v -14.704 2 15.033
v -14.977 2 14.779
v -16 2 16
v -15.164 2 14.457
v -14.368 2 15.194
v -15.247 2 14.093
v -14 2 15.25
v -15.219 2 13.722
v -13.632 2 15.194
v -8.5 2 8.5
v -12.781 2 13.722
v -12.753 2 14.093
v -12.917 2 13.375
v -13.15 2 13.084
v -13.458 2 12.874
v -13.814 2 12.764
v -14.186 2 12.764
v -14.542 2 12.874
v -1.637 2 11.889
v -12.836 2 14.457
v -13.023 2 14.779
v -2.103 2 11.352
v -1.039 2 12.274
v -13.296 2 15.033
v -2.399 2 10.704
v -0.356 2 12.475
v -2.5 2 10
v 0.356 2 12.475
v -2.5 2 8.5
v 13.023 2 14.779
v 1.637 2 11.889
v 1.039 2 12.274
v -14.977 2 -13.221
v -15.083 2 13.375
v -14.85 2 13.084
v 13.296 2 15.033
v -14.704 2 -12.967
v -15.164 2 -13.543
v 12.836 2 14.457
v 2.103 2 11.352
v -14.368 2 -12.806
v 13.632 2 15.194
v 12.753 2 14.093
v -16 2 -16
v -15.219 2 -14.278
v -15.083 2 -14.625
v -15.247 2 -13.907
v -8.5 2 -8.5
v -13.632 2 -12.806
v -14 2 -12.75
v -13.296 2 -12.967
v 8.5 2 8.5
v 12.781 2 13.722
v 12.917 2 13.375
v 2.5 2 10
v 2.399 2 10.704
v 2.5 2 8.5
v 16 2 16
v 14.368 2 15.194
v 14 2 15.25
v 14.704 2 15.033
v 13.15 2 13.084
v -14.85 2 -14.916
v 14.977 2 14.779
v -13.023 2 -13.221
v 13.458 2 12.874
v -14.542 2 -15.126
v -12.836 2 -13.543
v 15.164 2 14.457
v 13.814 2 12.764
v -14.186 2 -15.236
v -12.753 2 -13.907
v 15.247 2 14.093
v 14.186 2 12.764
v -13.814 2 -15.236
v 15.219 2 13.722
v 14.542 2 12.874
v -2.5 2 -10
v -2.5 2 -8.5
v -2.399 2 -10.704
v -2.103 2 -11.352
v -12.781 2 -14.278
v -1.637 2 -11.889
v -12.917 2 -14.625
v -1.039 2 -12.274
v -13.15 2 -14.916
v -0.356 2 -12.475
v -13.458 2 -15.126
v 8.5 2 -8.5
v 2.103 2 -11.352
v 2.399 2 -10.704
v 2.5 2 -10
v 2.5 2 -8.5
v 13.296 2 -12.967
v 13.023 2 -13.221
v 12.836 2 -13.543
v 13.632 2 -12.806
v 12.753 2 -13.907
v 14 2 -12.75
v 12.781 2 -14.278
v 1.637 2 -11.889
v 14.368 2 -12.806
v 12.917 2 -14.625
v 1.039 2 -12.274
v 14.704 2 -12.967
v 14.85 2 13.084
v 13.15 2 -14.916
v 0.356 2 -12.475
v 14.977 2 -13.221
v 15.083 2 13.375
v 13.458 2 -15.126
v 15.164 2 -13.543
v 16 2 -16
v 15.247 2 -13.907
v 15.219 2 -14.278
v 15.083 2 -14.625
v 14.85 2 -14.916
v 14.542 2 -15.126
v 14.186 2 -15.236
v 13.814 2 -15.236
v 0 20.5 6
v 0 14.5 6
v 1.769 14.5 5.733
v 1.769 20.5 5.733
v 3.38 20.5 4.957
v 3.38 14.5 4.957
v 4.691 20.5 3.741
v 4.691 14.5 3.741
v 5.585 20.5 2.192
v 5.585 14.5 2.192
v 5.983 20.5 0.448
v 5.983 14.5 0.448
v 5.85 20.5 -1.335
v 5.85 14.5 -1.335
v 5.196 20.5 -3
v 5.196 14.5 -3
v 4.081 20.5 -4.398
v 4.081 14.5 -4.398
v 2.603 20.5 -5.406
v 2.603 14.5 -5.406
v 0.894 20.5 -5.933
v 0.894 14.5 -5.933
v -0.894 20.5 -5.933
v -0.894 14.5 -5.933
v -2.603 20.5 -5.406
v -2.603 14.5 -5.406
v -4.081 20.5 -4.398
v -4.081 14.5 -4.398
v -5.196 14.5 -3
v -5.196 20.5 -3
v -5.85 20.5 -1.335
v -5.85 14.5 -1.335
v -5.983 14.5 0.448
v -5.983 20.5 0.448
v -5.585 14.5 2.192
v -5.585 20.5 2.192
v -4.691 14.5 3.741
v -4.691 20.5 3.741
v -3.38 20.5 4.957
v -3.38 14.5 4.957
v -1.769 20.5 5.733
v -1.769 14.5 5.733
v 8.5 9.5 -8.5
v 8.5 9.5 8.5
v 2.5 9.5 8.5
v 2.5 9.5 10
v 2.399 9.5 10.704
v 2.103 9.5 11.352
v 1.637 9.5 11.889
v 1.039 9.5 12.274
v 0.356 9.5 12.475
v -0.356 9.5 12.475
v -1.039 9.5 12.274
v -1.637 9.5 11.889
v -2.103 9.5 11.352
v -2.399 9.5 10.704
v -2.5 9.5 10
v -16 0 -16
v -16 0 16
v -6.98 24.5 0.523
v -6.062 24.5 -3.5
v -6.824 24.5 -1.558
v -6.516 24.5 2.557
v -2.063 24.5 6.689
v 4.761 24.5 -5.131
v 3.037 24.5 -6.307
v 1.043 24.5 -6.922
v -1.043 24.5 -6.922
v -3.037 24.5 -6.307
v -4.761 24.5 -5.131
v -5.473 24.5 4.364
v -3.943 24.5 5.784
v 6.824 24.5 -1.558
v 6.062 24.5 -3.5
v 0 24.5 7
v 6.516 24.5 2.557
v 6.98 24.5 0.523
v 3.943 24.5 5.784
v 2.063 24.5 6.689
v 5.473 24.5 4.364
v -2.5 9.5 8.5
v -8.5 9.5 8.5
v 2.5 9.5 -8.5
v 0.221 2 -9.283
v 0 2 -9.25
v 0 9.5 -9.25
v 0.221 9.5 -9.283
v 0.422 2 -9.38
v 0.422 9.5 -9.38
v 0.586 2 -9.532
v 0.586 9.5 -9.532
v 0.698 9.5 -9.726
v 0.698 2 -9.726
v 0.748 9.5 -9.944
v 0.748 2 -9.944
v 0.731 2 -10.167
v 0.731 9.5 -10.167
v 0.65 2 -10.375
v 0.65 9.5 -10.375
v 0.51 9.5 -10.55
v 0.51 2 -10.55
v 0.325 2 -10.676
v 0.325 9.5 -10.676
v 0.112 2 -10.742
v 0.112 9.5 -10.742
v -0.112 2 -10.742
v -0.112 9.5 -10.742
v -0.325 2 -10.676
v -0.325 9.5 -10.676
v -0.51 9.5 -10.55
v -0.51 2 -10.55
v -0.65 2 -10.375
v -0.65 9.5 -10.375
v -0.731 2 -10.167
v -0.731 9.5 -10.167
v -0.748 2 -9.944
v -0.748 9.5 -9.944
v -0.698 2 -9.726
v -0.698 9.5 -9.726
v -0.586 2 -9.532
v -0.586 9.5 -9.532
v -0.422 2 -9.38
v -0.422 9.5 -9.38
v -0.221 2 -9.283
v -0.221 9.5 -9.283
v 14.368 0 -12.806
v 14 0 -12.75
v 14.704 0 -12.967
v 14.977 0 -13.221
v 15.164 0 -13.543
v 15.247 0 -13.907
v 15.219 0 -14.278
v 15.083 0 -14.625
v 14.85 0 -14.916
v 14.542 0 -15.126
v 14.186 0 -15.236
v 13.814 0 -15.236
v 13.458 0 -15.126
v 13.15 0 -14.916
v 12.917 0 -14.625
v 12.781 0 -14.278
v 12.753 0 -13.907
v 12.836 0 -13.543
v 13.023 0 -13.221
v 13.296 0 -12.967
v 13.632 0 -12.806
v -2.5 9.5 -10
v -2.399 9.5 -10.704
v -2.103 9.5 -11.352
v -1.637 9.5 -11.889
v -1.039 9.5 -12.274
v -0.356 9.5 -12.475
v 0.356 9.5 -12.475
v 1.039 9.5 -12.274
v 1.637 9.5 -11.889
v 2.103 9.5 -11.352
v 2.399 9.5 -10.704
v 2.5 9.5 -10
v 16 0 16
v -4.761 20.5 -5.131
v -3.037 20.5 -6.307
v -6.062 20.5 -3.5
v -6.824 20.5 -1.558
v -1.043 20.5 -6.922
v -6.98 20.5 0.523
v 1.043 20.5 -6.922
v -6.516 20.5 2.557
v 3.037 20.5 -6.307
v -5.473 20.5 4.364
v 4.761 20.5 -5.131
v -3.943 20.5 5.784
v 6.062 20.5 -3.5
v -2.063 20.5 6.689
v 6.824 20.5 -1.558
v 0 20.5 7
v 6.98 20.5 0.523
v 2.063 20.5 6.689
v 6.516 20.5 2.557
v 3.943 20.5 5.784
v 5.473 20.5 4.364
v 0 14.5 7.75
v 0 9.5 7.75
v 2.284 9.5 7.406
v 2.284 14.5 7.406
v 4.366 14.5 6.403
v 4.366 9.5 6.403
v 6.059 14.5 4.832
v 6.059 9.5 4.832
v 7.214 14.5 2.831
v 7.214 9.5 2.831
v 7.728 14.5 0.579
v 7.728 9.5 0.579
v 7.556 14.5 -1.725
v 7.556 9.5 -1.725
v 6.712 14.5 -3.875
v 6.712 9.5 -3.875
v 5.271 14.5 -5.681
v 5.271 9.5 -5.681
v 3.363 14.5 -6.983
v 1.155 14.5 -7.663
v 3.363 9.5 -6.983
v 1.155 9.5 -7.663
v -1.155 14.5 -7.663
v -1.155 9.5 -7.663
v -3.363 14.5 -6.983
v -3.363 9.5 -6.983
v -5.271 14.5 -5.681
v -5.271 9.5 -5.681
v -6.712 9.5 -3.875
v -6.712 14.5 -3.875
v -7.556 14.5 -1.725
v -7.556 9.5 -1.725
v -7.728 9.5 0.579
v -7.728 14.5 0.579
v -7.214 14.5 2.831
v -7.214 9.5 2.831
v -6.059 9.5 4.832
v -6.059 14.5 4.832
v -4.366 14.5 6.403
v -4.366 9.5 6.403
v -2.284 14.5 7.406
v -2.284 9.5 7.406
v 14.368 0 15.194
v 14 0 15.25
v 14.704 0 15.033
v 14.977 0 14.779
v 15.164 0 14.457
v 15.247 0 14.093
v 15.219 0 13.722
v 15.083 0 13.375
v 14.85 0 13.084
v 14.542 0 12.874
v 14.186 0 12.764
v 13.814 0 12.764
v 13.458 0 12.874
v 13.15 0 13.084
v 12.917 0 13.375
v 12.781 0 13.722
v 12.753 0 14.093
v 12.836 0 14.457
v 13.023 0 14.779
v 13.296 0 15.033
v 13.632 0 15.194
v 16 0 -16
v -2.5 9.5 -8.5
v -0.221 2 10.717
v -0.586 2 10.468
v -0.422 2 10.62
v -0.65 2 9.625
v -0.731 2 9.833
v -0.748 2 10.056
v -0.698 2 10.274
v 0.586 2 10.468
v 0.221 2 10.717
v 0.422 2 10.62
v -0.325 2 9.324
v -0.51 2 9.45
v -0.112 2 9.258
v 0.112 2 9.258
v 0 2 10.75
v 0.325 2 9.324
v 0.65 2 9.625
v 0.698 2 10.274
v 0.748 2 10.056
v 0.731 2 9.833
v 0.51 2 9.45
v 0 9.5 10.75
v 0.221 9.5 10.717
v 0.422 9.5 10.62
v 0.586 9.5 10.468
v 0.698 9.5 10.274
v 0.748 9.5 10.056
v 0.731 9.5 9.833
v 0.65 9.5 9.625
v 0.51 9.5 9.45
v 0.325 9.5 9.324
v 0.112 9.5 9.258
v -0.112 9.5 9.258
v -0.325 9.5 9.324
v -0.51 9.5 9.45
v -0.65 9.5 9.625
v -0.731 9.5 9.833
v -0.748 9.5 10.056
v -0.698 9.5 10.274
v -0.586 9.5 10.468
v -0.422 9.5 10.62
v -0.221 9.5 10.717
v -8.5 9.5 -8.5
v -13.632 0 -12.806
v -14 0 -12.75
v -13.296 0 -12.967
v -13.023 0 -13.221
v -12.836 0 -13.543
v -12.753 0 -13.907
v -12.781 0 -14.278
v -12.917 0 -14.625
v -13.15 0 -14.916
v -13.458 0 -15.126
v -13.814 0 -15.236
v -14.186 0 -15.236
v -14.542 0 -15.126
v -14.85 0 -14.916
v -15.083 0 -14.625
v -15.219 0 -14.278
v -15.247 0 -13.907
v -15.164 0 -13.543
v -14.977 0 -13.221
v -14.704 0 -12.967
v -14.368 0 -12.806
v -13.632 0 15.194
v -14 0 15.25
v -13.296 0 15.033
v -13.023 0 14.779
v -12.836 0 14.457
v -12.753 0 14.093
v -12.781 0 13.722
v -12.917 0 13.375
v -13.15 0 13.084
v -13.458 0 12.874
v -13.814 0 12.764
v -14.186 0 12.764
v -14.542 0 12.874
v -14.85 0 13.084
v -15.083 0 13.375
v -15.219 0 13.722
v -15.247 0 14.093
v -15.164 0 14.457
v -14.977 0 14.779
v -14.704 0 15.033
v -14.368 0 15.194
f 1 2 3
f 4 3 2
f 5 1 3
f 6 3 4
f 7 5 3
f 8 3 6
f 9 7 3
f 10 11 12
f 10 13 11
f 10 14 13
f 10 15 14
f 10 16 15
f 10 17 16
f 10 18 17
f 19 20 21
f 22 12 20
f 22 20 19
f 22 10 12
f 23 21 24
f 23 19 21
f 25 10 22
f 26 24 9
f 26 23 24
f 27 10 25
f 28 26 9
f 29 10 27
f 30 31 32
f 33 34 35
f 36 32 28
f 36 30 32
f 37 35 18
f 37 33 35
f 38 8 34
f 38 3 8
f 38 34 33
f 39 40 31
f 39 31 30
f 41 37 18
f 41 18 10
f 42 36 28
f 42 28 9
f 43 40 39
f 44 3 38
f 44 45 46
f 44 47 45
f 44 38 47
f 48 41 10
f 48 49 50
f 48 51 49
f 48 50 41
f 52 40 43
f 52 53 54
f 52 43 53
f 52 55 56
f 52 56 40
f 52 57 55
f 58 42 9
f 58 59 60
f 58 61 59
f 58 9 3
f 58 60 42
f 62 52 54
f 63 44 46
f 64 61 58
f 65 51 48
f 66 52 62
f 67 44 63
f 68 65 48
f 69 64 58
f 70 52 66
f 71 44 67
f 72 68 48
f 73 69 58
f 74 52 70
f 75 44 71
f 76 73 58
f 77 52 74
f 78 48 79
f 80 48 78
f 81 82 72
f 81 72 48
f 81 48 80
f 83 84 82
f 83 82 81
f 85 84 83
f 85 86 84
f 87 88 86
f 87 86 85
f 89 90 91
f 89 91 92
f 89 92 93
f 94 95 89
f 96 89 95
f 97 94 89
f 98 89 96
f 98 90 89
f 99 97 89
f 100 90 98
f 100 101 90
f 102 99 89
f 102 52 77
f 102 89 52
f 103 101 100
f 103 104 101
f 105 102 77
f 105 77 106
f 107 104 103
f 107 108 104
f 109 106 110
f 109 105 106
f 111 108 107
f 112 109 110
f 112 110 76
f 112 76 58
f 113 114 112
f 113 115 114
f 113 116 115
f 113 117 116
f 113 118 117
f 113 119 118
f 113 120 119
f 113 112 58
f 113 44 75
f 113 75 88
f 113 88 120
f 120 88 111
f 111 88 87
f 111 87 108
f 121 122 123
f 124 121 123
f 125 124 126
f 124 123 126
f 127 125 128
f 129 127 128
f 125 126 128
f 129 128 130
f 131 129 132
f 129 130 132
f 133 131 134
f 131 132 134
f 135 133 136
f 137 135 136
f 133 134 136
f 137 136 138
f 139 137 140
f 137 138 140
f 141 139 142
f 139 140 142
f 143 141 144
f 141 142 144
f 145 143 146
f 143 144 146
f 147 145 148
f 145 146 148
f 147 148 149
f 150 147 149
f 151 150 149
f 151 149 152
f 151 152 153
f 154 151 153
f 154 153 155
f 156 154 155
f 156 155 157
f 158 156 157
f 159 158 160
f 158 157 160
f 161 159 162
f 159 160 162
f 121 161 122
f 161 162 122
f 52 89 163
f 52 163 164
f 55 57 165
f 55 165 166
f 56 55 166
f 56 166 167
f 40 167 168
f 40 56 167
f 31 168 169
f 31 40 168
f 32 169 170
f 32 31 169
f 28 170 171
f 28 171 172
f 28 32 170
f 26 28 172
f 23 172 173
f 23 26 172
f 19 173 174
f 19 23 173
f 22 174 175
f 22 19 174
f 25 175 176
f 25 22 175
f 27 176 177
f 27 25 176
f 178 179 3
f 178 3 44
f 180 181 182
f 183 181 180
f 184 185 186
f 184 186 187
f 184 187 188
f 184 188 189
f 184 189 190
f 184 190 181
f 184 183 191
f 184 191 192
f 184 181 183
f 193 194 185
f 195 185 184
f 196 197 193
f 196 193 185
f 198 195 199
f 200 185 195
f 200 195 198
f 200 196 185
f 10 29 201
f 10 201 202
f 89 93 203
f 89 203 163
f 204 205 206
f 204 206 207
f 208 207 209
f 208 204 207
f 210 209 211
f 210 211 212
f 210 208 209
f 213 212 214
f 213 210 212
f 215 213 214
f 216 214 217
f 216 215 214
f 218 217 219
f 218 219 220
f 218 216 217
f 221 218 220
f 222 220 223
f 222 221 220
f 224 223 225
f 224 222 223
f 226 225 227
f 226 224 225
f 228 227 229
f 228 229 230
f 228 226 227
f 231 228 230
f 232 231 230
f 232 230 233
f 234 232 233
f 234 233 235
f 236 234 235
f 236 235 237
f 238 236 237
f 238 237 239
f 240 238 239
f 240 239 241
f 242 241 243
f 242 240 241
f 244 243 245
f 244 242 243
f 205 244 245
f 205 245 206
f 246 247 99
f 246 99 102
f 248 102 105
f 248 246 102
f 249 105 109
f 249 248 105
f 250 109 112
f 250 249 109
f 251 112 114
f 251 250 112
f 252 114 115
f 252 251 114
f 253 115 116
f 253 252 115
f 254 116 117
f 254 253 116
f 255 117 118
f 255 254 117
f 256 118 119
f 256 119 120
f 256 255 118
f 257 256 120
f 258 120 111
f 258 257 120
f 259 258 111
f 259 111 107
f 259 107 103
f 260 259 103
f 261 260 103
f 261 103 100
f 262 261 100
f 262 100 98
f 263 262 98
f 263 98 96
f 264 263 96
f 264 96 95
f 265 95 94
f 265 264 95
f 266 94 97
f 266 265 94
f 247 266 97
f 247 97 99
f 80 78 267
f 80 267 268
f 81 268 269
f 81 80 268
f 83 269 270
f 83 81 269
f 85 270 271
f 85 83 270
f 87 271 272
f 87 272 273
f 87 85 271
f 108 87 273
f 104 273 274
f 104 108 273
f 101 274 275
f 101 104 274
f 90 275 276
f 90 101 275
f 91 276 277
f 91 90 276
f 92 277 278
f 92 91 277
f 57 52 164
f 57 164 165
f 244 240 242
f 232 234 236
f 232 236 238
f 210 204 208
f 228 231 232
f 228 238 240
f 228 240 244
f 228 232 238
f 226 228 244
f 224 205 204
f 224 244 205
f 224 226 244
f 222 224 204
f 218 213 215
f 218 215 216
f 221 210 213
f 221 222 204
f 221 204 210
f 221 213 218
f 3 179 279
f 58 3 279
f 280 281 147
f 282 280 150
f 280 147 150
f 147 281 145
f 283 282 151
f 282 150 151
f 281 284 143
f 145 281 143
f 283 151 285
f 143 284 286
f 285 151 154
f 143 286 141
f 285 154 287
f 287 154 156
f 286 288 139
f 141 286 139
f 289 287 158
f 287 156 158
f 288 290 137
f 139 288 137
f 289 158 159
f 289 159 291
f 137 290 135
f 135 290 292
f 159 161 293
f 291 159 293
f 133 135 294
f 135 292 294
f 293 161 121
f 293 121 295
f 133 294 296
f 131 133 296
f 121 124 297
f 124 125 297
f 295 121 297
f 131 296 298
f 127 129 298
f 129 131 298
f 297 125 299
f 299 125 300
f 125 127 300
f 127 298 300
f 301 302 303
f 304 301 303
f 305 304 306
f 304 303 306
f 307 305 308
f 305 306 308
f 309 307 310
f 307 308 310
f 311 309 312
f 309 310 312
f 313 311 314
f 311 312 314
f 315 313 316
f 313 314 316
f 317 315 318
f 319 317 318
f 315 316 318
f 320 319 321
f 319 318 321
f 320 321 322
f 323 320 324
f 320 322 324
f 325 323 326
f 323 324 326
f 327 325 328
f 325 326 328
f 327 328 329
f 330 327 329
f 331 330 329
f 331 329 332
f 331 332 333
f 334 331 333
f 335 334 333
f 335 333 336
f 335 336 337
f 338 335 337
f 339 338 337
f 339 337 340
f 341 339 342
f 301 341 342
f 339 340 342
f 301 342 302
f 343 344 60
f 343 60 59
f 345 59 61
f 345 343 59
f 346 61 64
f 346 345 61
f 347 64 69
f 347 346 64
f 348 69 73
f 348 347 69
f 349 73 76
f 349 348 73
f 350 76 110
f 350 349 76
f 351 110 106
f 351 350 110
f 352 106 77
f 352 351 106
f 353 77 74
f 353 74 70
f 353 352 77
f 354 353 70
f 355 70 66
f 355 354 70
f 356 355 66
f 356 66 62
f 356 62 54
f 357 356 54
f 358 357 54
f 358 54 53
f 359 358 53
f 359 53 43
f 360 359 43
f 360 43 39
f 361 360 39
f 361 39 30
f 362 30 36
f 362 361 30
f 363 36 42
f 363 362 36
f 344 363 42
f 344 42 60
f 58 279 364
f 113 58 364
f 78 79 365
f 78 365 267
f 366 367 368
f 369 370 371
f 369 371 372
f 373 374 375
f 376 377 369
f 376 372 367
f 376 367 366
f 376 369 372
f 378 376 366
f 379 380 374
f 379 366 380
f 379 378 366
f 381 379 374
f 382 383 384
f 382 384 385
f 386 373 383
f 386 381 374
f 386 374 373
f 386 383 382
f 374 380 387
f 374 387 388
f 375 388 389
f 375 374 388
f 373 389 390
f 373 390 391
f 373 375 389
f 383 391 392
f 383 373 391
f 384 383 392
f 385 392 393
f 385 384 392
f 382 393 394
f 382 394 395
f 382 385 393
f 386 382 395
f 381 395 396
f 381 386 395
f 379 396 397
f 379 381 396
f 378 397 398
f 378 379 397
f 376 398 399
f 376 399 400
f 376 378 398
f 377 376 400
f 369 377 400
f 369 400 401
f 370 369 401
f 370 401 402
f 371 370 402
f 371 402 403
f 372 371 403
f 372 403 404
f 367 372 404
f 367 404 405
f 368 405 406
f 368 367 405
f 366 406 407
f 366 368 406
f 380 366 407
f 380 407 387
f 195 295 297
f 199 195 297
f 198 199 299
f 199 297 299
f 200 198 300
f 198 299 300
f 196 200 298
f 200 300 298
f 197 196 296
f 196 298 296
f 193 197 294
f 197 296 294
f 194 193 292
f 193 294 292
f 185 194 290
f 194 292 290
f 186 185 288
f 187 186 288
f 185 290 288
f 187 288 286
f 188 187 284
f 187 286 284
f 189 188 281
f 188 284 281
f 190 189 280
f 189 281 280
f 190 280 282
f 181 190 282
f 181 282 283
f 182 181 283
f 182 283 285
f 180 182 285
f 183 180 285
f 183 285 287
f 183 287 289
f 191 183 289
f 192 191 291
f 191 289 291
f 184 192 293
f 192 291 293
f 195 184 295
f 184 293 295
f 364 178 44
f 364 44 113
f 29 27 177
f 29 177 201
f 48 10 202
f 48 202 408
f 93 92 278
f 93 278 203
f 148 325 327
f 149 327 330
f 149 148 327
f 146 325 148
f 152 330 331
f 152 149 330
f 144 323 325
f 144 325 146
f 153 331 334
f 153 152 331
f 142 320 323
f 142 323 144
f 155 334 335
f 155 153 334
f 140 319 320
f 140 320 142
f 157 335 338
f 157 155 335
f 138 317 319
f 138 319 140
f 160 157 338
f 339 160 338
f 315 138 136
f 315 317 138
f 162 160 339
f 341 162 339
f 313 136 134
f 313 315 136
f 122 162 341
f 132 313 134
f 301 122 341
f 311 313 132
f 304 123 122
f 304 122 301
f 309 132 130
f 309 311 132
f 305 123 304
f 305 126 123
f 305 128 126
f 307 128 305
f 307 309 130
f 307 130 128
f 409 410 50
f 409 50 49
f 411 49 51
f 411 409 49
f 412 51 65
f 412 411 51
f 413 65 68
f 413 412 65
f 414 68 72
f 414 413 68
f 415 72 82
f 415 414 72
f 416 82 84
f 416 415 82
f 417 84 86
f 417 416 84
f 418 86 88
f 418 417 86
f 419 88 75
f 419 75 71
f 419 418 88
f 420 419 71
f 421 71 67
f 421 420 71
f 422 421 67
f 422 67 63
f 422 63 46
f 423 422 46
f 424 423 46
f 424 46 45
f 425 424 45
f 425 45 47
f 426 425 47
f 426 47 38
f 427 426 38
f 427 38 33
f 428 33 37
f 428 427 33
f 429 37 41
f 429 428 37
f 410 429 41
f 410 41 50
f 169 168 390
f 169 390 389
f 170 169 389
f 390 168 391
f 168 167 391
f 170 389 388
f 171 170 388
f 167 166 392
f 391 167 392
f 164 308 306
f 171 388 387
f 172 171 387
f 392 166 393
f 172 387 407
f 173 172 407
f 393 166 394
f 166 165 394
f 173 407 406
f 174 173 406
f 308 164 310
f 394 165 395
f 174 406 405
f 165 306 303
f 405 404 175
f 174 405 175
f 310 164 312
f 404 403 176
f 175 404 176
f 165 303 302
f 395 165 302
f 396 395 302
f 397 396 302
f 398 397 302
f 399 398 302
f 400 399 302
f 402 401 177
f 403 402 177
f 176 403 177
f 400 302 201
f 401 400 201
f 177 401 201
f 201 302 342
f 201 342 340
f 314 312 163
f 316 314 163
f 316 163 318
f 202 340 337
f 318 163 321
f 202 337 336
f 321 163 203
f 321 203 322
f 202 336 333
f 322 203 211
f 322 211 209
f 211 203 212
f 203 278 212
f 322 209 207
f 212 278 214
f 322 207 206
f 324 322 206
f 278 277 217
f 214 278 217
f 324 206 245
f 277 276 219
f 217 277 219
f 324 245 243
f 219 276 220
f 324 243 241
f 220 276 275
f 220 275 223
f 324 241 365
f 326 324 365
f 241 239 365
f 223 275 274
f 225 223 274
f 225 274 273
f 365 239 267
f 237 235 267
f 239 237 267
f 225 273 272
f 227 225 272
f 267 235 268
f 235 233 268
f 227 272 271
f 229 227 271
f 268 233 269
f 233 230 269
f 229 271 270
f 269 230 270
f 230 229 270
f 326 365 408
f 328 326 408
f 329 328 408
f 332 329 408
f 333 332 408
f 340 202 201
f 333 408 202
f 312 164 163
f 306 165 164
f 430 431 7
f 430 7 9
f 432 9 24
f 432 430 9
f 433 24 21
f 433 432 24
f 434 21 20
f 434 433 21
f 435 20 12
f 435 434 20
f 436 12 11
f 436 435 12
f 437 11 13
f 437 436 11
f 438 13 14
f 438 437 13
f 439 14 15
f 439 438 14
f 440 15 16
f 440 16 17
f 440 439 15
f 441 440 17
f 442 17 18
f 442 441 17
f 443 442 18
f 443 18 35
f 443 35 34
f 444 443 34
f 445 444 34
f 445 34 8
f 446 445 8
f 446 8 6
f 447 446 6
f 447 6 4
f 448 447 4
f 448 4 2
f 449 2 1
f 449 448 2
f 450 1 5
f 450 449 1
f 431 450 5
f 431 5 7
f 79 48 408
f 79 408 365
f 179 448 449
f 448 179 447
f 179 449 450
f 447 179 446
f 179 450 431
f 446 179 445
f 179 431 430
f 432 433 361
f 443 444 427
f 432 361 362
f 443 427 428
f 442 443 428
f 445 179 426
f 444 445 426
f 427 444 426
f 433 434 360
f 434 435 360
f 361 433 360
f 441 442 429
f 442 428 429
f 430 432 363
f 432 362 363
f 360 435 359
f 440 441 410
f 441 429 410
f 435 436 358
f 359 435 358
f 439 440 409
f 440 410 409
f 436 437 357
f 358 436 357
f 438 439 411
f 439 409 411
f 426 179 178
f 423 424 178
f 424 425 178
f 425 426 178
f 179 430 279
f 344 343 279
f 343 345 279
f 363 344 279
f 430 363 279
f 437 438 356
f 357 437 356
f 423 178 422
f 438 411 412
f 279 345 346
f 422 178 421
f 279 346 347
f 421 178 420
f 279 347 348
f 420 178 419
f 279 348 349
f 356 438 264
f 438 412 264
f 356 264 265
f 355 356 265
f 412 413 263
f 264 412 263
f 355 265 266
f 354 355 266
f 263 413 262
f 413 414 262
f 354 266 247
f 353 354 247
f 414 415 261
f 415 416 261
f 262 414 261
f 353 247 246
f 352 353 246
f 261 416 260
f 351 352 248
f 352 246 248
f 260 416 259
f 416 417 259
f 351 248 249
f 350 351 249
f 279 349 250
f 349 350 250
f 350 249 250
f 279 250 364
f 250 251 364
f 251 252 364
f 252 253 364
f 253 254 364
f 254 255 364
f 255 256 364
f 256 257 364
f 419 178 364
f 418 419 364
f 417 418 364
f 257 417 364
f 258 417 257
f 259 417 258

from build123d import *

# Parameters (mm, degrees)
SKETCH_1_W      = 32
SKETCH_1_H      = 32
SKETCH_1_R      = 1.25
EXTRUDE_1_DEPTH = 2
SKETCH_2_R      = 0.75
EXTRUDE_2_DEPTH = 7.5
SKETCH_3_R      = 7.75
EXTRUDE_3_DEPTH = 5
SKETCH_4_R      = 6
EXTRUDE_4_DEPTH = 6
SKETCH_5_R      = 7
EXTRUDE_5_DEPTH = 4


with BuildPart() as part:
    # 草图1 → 凸台-拉伸1 (new body)
    with BuildSketch(Plane(origin=(0, 0, 0), x_dir=(1, 0, 0), z_dir=(0, 1, 0))):
        Rectangle(SKETCH_1_W, SKETCH_1_H)
        with Locations(Location((-14, 14, 0), (0, 0, 270))):
            Circle(SKETCH_1_R, mode=Mode.SUBTRACT)
        with Locations(Location((14, 14, 0), (0, 0, 270))):
            Circle(SKETCH_1_R, mode=Mode.SUBTRACT)
        with Locations(Location((14, -14, 0), (0, 0, 270))):
            Circle(SKETCH_1_R, mode=Mode.SUBTRACT)
        with Locations(Location((-14, -14, 0), (0, 0, 270))):
            Circle(SKETCH_1_R, mode=Mode.SUBTRACT)
    extrude(amount=EXTRUDE_1_DEPTH)

    # 草图2 → 凸台-拉伸2 (add)
    with BuildSketch(Plane(origin=(0, 2, 0), x_dir=(1, 0, 0), z_dir=(0, 1, 0))):
        with BuildLine():
            Line((-2.5, -10), (-2.5, -8.5))
            Line((-2.5, -8.5), (-8.5, -8.5))
            Line((-8.5, -8.5), (-8.5, 8.5))
            Line((-8.5, 8.5), (-2.5, 8.5))
            Line((-2.5, 8.5), (-2.5, 10))
            ThreePointArc((-2.5, 10), (0, 12.5), (2.5, 10))
            Line((2.5, 10), (2.5, 8.5))
            Line((2.5, 8.5), (8.5, 8.5))
            Line((8.5, 8.5), (8.5, -8.5))
            Line((8.5, -8.5), (2.5, -8.5))
            Line((2.5, -8.5), (2.5, -10))
            ThreePointArc((2.5, -10), (0, -12.5), (-2.5, -10))
        make_face()
        with Locations(Location((0, 10, 0), (0, 0, 270))):
            Circle(SKETCH_2_R, mode=Mode.SUBTRACT)
        with Locations(Location((0, -10, 0), (0, 0, 270))):
            Circle(SKETCH_2_R, mode=Mode.SUBTRACT)
    extrude(amount=EXTRUDE_2_DEPTH)

    # 草图3 → 凸台-拉伸3 (add)
    with BuildSketch(Plane(origin=(0, 9.5, 0), x_dir=(1, 0, 0), z_dir=(0, 1, 0))):
        with Locations(Location((0, 0, 0), (0, 0, 270))):
            Circle(SKETCH_3_R)
    extrude(amount=EXTRUDE_3_DEPTH)

    # 草图4 → 凸台-拉伸4 (add)
    with BuildSketch(Plane(origin=(0, 14.5, 0), x_dir=(1, 0, 0), z_dir=(0, 1, 0))):
        with Locations(Location((0, 0, 0), (0, 0, 270))):
            Circle(SKETCH_4_R)
    extrude(amount=EXTRUDE_4_DEPTH)

    # 草图5 → 凸台-拉伸5 (add)
    with BuildSketch(Plane(origin=(0, 20.5, 0), x_dir=(1, 0, 0), z_dir=(0, 1, 0))):
        with Locations(Location((0, 0, 0), (0, 0, 270))):
            Circle(SKETCH_5_R)
    extrude(amount=EXTRUDE_5_DEPTH)


solid = part.part
